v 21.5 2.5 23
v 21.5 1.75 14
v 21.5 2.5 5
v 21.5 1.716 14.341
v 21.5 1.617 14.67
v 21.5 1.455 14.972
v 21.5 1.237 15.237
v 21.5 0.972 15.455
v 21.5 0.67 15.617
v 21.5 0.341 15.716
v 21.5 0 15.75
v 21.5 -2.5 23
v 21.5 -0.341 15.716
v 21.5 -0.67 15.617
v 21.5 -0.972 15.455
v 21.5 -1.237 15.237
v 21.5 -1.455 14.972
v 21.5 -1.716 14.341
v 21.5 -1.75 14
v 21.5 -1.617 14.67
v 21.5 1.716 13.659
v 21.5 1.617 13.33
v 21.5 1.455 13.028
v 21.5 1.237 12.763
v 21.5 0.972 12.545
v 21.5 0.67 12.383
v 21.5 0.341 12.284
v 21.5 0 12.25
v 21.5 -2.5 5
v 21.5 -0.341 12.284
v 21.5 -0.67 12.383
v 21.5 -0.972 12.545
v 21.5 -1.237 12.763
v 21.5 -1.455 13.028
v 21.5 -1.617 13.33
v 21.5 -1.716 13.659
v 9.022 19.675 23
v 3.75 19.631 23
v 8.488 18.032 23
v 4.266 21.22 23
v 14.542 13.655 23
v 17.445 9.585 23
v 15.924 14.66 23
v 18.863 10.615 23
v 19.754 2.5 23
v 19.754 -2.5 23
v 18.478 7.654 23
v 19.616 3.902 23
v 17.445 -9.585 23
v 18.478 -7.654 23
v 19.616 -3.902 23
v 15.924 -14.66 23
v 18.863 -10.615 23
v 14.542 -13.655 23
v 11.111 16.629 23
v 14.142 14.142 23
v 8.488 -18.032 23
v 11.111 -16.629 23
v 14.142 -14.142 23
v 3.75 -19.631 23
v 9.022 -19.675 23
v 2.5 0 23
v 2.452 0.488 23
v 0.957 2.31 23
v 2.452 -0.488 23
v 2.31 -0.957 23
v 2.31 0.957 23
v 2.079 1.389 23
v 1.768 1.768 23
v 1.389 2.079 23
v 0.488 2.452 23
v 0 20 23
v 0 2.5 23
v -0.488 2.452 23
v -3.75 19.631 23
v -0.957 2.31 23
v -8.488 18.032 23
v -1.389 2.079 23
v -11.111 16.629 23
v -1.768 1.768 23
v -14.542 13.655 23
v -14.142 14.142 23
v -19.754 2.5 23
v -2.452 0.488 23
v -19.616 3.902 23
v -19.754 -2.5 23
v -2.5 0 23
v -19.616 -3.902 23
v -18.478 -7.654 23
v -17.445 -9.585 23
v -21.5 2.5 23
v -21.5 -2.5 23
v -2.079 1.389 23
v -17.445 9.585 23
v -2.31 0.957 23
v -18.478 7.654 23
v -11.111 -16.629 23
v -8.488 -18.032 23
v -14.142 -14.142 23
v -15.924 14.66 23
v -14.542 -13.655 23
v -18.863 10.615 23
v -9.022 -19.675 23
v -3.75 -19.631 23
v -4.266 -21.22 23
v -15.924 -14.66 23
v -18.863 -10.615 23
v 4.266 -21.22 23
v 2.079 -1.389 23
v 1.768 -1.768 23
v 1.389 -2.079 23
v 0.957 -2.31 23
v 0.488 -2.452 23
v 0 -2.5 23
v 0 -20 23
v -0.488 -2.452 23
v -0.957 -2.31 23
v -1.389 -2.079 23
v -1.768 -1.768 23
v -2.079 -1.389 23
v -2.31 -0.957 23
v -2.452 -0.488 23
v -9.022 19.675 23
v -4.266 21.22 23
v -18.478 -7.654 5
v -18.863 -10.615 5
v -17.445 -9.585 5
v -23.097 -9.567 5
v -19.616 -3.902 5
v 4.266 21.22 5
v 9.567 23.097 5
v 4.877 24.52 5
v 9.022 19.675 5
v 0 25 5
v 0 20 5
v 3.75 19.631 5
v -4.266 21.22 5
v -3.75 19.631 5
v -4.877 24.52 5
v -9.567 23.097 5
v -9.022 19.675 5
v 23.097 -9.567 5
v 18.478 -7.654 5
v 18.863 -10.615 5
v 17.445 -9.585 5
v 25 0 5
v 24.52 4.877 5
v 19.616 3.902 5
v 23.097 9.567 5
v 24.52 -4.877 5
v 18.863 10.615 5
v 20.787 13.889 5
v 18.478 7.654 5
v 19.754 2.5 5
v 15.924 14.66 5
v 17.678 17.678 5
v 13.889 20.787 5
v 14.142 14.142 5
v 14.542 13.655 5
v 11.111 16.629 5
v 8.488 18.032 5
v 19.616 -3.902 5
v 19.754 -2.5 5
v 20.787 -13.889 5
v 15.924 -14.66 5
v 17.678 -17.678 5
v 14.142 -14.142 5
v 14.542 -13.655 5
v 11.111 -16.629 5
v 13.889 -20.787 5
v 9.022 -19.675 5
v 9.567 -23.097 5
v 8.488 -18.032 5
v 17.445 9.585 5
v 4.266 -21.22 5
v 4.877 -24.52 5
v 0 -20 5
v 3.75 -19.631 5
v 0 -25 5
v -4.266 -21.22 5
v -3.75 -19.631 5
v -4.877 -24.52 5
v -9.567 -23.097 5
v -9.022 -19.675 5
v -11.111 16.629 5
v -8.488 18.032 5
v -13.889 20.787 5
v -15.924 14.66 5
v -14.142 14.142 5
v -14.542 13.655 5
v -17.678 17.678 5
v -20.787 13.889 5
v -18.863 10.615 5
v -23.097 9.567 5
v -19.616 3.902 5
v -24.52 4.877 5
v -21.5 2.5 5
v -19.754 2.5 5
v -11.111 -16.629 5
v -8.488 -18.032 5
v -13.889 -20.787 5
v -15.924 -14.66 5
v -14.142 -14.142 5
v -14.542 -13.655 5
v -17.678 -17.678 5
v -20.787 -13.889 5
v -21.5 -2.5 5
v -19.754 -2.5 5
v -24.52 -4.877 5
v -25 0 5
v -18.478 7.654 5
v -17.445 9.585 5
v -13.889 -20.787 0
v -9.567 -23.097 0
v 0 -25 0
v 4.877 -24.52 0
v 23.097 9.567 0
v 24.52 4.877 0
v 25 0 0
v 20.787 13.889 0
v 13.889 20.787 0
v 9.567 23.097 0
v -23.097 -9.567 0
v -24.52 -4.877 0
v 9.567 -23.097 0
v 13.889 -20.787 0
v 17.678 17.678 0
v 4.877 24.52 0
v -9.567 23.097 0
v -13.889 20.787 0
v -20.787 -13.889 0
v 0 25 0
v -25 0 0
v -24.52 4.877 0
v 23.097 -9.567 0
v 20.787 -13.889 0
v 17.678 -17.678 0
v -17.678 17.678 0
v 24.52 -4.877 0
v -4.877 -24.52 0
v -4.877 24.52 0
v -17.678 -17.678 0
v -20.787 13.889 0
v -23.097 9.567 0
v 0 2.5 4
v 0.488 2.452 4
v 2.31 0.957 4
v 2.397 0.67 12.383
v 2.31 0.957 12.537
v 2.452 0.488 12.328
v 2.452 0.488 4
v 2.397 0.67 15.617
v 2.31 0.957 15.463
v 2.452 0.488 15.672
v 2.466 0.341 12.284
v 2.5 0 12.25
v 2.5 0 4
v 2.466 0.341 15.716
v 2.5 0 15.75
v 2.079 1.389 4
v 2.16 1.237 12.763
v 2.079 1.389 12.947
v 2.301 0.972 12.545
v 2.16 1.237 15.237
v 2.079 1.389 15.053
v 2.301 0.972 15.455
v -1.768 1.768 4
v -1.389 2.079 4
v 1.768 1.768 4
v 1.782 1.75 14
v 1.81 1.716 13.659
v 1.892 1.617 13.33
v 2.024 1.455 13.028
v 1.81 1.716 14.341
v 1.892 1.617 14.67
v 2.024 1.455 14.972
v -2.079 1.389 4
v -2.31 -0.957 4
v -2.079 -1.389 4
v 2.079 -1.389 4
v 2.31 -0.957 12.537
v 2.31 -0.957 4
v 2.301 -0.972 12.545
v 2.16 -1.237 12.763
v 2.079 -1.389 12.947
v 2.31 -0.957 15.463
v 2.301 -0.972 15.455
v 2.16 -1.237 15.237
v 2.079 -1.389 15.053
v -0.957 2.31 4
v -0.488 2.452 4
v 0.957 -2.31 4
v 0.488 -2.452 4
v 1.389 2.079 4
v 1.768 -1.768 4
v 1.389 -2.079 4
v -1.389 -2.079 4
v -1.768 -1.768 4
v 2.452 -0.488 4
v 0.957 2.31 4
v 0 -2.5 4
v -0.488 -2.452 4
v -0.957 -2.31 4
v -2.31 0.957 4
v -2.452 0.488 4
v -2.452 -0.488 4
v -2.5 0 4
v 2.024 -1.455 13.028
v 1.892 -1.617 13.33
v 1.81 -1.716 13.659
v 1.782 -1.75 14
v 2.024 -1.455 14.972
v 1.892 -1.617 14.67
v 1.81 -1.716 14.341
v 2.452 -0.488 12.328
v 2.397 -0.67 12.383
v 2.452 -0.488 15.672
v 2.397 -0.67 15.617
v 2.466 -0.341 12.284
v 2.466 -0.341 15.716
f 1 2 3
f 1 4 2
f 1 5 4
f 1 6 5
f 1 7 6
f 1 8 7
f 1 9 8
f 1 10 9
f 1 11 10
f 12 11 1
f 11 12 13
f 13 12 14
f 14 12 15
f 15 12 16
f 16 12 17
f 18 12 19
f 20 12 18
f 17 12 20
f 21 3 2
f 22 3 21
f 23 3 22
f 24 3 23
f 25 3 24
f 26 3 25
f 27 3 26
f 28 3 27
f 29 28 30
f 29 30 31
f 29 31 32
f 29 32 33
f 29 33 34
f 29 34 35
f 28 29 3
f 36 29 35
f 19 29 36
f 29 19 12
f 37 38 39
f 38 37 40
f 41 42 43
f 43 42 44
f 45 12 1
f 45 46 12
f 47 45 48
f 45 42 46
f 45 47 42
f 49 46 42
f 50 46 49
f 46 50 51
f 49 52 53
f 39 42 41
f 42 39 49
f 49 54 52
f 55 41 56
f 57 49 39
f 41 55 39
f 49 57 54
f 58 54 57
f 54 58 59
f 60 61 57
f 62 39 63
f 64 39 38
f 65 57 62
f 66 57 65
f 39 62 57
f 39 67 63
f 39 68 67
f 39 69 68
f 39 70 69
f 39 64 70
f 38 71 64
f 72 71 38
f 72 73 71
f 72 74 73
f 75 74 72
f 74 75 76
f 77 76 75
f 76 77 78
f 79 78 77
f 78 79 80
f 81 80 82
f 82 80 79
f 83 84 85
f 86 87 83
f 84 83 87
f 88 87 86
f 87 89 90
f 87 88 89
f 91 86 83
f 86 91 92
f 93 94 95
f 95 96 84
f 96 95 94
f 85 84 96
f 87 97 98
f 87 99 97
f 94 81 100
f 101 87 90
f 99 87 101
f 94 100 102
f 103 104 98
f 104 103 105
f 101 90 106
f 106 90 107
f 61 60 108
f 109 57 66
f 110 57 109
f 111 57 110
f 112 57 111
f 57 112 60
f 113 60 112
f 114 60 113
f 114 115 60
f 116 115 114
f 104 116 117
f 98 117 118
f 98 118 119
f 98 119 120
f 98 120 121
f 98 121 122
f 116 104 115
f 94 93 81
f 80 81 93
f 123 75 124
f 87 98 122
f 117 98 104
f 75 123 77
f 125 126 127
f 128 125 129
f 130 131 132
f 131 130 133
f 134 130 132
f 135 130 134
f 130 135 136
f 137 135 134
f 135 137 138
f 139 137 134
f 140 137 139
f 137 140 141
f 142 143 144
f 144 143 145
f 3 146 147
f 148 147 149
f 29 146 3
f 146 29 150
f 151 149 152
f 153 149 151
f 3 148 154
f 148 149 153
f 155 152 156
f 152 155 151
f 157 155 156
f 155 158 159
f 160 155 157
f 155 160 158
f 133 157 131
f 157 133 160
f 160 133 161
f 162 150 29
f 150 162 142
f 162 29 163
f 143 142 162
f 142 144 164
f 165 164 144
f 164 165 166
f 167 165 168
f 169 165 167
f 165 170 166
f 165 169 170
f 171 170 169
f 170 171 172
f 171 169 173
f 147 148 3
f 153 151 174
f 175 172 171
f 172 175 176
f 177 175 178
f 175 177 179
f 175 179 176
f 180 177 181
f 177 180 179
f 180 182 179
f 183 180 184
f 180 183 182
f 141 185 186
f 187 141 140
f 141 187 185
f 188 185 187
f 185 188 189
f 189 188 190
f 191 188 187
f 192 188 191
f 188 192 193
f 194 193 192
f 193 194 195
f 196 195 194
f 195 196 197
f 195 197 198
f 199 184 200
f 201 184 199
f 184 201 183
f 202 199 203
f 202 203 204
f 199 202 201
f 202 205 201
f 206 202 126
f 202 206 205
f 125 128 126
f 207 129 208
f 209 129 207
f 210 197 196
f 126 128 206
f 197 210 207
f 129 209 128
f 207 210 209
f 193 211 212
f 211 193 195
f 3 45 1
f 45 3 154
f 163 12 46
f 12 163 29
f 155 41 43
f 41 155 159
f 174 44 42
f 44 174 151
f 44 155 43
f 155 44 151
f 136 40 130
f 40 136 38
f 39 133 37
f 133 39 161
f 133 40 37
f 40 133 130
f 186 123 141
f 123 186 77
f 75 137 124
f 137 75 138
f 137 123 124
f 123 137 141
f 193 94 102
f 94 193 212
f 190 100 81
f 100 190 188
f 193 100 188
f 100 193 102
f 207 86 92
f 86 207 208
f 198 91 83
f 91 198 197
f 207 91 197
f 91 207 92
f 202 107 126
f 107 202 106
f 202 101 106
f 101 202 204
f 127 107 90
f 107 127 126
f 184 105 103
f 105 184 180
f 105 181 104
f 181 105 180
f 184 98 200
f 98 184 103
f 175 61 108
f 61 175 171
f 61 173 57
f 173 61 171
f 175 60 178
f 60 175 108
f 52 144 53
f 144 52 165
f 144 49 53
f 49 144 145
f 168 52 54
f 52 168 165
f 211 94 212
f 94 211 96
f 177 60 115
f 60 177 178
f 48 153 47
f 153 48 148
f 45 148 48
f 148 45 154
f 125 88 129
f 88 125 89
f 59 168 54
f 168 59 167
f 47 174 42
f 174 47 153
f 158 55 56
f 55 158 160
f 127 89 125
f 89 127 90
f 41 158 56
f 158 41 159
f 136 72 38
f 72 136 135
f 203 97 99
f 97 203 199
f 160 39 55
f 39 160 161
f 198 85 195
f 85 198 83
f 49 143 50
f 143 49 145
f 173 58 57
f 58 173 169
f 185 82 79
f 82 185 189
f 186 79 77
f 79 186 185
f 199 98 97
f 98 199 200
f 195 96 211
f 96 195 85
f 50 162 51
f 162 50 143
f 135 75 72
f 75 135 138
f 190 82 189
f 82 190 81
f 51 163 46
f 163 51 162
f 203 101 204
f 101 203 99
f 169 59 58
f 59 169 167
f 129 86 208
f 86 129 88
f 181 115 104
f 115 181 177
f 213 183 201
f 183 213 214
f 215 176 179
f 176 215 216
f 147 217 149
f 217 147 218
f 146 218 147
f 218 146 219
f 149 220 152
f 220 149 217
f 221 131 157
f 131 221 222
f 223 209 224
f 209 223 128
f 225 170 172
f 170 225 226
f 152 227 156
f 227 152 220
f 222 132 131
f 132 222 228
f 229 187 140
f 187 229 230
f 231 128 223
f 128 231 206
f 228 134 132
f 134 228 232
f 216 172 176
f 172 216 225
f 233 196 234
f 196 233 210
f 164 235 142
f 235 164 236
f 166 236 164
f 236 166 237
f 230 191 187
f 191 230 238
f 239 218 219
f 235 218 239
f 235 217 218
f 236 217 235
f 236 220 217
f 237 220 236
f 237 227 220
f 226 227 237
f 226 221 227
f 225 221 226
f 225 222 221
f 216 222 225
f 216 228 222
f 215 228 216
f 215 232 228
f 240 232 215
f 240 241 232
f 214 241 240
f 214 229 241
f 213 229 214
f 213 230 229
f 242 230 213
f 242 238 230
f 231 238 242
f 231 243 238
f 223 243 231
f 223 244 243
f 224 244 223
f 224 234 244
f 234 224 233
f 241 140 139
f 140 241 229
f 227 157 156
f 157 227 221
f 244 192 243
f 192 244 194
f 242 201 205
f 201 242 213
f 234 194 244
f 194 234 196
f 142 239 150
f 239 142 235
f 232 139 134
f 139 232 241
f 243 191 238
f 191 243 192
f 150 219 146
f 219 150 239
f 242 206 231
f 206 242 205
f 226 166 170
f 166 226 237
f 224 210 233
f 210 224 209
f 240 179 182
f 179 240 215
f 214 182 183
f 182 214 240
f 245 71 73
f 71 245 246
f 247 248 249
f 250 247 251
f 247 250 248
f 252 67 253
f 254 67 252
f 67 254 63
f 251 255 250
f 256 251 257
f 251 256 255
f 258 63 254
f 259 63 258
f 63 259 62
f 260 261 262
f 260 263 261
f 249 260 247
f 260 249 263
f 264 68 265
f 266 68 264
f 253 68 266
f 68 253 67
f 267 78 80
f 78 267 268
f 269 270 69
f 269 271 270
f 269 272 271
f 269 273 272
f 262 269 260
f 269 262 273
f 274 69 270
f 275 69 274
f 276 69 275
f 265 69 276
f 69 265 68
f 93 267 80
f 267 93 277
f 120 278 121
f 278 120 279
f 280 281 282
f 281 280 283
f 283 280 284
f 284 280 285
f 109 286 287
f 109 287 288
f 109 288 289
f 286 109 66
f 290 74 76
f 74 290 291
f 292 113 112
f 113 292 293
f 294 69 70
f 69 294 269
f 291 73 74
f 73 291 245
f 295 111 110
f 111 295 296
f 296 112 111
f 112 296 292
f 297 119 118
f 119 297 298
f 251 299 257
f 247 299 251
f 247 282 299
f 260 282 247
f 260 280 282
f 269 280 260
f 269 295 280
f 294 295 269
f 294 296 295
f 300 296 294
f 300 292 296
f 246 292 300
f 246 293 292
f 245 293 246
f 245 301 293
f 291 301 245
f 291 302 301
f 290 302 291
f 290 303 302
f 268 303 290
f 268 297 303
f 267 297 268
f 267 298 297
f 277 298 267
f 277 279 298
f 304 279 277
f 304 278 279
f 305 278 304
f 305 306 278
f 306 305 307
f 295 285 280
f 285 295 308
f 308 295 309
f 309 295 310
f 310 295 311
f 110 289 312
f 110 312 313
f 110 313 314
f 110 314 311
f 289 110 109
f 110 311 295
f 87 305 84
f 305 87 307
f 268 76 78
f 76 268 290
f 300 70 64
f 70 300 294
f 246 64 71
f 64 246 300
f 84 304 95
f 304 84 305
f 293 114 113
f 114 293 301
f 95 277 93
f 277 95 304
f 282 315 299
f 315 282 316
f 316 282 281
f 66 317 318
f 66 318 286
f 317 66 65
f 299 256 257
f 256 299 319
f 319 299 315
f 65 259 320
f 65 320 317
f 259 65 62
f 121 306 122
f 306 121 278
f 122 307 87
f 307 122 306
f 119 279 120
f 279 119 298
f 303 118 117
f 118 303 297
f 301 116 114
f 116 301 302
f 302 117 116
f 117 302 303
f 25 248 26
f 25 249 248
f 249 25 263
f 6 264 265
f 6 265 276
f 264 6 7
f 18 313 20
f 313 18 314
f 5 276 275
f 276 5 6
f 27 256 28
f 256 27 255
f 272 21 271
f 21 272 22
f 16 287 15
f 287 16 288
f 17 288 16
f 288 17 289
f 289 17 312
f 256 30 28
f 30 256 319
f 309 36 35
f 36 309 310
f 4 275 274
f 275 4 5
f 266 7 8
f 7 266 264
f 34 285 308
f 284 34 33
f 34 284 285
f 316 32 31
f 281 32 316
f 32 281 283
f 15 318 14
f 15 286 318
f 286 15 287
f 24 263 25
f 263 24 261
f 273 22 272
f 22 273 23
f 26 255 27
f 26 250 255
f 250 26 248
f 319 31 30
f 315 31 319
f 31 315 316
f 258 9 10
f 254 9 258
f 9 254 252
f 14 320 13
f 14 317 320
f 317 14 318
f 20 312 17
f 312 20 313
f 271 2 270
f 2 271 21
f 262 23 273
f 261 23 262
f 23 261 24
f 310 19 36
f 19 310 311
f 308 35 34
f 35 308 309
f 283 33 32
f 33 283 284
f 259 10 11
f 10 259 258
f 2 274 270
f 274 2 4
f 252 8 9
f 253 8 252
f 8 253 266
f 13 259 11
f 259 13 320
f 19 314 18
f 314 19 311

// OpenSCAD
$fn = 32;

// ----------------------------------------------------------------------
// Control knob: skirt knob with grip ribs
// ----------------------------------------------------------------------

// --- parameters (mm) ---
skirt_d = 50;             // skirt diameter
skirt_t = 5;              // skirt thickness
rib_w = 5;                // grip rib width
rib_out = 2.5;            // grip rib radial protrusion
n_ribs = 10;              // number of grip ribs
knob_d = 40;              // knob body diameter
knob_h = 18;              // knob body height
bore_d = 5;               // shaft bore diameter
set_d = 3.5;              // set screw bore diameter

rib_step = 360 / n_ribs;  // rib angular step
total_h = skirt_t + knob_h;  // overall height

difference() {
  union() {
    translate([0, 0, skirt_t]) cylinder(h = knob_h, d = knob_d);
    cylinder(h = skirt_t, d = skirt_d);
    for (i = [0 : n_ribs - 1])
      rotate([0, 0, i * rib_step])
        translate([knob_d / 2 - 1, -rib_w / 2, skirt_t])
          cube([rib_out, rib_w, knob_h]);
  }
  translate([0, 0, skirt_t - 1]) cylinder(h = knob_h + 2, d = bore_d);
  translate([-1, 0, skirt_t + knob_h / 2]) rotate([0, 90, 0])
    cylinder(h = knob_d / 2 + bore_d / 2 + 2, d = set_d);
}
